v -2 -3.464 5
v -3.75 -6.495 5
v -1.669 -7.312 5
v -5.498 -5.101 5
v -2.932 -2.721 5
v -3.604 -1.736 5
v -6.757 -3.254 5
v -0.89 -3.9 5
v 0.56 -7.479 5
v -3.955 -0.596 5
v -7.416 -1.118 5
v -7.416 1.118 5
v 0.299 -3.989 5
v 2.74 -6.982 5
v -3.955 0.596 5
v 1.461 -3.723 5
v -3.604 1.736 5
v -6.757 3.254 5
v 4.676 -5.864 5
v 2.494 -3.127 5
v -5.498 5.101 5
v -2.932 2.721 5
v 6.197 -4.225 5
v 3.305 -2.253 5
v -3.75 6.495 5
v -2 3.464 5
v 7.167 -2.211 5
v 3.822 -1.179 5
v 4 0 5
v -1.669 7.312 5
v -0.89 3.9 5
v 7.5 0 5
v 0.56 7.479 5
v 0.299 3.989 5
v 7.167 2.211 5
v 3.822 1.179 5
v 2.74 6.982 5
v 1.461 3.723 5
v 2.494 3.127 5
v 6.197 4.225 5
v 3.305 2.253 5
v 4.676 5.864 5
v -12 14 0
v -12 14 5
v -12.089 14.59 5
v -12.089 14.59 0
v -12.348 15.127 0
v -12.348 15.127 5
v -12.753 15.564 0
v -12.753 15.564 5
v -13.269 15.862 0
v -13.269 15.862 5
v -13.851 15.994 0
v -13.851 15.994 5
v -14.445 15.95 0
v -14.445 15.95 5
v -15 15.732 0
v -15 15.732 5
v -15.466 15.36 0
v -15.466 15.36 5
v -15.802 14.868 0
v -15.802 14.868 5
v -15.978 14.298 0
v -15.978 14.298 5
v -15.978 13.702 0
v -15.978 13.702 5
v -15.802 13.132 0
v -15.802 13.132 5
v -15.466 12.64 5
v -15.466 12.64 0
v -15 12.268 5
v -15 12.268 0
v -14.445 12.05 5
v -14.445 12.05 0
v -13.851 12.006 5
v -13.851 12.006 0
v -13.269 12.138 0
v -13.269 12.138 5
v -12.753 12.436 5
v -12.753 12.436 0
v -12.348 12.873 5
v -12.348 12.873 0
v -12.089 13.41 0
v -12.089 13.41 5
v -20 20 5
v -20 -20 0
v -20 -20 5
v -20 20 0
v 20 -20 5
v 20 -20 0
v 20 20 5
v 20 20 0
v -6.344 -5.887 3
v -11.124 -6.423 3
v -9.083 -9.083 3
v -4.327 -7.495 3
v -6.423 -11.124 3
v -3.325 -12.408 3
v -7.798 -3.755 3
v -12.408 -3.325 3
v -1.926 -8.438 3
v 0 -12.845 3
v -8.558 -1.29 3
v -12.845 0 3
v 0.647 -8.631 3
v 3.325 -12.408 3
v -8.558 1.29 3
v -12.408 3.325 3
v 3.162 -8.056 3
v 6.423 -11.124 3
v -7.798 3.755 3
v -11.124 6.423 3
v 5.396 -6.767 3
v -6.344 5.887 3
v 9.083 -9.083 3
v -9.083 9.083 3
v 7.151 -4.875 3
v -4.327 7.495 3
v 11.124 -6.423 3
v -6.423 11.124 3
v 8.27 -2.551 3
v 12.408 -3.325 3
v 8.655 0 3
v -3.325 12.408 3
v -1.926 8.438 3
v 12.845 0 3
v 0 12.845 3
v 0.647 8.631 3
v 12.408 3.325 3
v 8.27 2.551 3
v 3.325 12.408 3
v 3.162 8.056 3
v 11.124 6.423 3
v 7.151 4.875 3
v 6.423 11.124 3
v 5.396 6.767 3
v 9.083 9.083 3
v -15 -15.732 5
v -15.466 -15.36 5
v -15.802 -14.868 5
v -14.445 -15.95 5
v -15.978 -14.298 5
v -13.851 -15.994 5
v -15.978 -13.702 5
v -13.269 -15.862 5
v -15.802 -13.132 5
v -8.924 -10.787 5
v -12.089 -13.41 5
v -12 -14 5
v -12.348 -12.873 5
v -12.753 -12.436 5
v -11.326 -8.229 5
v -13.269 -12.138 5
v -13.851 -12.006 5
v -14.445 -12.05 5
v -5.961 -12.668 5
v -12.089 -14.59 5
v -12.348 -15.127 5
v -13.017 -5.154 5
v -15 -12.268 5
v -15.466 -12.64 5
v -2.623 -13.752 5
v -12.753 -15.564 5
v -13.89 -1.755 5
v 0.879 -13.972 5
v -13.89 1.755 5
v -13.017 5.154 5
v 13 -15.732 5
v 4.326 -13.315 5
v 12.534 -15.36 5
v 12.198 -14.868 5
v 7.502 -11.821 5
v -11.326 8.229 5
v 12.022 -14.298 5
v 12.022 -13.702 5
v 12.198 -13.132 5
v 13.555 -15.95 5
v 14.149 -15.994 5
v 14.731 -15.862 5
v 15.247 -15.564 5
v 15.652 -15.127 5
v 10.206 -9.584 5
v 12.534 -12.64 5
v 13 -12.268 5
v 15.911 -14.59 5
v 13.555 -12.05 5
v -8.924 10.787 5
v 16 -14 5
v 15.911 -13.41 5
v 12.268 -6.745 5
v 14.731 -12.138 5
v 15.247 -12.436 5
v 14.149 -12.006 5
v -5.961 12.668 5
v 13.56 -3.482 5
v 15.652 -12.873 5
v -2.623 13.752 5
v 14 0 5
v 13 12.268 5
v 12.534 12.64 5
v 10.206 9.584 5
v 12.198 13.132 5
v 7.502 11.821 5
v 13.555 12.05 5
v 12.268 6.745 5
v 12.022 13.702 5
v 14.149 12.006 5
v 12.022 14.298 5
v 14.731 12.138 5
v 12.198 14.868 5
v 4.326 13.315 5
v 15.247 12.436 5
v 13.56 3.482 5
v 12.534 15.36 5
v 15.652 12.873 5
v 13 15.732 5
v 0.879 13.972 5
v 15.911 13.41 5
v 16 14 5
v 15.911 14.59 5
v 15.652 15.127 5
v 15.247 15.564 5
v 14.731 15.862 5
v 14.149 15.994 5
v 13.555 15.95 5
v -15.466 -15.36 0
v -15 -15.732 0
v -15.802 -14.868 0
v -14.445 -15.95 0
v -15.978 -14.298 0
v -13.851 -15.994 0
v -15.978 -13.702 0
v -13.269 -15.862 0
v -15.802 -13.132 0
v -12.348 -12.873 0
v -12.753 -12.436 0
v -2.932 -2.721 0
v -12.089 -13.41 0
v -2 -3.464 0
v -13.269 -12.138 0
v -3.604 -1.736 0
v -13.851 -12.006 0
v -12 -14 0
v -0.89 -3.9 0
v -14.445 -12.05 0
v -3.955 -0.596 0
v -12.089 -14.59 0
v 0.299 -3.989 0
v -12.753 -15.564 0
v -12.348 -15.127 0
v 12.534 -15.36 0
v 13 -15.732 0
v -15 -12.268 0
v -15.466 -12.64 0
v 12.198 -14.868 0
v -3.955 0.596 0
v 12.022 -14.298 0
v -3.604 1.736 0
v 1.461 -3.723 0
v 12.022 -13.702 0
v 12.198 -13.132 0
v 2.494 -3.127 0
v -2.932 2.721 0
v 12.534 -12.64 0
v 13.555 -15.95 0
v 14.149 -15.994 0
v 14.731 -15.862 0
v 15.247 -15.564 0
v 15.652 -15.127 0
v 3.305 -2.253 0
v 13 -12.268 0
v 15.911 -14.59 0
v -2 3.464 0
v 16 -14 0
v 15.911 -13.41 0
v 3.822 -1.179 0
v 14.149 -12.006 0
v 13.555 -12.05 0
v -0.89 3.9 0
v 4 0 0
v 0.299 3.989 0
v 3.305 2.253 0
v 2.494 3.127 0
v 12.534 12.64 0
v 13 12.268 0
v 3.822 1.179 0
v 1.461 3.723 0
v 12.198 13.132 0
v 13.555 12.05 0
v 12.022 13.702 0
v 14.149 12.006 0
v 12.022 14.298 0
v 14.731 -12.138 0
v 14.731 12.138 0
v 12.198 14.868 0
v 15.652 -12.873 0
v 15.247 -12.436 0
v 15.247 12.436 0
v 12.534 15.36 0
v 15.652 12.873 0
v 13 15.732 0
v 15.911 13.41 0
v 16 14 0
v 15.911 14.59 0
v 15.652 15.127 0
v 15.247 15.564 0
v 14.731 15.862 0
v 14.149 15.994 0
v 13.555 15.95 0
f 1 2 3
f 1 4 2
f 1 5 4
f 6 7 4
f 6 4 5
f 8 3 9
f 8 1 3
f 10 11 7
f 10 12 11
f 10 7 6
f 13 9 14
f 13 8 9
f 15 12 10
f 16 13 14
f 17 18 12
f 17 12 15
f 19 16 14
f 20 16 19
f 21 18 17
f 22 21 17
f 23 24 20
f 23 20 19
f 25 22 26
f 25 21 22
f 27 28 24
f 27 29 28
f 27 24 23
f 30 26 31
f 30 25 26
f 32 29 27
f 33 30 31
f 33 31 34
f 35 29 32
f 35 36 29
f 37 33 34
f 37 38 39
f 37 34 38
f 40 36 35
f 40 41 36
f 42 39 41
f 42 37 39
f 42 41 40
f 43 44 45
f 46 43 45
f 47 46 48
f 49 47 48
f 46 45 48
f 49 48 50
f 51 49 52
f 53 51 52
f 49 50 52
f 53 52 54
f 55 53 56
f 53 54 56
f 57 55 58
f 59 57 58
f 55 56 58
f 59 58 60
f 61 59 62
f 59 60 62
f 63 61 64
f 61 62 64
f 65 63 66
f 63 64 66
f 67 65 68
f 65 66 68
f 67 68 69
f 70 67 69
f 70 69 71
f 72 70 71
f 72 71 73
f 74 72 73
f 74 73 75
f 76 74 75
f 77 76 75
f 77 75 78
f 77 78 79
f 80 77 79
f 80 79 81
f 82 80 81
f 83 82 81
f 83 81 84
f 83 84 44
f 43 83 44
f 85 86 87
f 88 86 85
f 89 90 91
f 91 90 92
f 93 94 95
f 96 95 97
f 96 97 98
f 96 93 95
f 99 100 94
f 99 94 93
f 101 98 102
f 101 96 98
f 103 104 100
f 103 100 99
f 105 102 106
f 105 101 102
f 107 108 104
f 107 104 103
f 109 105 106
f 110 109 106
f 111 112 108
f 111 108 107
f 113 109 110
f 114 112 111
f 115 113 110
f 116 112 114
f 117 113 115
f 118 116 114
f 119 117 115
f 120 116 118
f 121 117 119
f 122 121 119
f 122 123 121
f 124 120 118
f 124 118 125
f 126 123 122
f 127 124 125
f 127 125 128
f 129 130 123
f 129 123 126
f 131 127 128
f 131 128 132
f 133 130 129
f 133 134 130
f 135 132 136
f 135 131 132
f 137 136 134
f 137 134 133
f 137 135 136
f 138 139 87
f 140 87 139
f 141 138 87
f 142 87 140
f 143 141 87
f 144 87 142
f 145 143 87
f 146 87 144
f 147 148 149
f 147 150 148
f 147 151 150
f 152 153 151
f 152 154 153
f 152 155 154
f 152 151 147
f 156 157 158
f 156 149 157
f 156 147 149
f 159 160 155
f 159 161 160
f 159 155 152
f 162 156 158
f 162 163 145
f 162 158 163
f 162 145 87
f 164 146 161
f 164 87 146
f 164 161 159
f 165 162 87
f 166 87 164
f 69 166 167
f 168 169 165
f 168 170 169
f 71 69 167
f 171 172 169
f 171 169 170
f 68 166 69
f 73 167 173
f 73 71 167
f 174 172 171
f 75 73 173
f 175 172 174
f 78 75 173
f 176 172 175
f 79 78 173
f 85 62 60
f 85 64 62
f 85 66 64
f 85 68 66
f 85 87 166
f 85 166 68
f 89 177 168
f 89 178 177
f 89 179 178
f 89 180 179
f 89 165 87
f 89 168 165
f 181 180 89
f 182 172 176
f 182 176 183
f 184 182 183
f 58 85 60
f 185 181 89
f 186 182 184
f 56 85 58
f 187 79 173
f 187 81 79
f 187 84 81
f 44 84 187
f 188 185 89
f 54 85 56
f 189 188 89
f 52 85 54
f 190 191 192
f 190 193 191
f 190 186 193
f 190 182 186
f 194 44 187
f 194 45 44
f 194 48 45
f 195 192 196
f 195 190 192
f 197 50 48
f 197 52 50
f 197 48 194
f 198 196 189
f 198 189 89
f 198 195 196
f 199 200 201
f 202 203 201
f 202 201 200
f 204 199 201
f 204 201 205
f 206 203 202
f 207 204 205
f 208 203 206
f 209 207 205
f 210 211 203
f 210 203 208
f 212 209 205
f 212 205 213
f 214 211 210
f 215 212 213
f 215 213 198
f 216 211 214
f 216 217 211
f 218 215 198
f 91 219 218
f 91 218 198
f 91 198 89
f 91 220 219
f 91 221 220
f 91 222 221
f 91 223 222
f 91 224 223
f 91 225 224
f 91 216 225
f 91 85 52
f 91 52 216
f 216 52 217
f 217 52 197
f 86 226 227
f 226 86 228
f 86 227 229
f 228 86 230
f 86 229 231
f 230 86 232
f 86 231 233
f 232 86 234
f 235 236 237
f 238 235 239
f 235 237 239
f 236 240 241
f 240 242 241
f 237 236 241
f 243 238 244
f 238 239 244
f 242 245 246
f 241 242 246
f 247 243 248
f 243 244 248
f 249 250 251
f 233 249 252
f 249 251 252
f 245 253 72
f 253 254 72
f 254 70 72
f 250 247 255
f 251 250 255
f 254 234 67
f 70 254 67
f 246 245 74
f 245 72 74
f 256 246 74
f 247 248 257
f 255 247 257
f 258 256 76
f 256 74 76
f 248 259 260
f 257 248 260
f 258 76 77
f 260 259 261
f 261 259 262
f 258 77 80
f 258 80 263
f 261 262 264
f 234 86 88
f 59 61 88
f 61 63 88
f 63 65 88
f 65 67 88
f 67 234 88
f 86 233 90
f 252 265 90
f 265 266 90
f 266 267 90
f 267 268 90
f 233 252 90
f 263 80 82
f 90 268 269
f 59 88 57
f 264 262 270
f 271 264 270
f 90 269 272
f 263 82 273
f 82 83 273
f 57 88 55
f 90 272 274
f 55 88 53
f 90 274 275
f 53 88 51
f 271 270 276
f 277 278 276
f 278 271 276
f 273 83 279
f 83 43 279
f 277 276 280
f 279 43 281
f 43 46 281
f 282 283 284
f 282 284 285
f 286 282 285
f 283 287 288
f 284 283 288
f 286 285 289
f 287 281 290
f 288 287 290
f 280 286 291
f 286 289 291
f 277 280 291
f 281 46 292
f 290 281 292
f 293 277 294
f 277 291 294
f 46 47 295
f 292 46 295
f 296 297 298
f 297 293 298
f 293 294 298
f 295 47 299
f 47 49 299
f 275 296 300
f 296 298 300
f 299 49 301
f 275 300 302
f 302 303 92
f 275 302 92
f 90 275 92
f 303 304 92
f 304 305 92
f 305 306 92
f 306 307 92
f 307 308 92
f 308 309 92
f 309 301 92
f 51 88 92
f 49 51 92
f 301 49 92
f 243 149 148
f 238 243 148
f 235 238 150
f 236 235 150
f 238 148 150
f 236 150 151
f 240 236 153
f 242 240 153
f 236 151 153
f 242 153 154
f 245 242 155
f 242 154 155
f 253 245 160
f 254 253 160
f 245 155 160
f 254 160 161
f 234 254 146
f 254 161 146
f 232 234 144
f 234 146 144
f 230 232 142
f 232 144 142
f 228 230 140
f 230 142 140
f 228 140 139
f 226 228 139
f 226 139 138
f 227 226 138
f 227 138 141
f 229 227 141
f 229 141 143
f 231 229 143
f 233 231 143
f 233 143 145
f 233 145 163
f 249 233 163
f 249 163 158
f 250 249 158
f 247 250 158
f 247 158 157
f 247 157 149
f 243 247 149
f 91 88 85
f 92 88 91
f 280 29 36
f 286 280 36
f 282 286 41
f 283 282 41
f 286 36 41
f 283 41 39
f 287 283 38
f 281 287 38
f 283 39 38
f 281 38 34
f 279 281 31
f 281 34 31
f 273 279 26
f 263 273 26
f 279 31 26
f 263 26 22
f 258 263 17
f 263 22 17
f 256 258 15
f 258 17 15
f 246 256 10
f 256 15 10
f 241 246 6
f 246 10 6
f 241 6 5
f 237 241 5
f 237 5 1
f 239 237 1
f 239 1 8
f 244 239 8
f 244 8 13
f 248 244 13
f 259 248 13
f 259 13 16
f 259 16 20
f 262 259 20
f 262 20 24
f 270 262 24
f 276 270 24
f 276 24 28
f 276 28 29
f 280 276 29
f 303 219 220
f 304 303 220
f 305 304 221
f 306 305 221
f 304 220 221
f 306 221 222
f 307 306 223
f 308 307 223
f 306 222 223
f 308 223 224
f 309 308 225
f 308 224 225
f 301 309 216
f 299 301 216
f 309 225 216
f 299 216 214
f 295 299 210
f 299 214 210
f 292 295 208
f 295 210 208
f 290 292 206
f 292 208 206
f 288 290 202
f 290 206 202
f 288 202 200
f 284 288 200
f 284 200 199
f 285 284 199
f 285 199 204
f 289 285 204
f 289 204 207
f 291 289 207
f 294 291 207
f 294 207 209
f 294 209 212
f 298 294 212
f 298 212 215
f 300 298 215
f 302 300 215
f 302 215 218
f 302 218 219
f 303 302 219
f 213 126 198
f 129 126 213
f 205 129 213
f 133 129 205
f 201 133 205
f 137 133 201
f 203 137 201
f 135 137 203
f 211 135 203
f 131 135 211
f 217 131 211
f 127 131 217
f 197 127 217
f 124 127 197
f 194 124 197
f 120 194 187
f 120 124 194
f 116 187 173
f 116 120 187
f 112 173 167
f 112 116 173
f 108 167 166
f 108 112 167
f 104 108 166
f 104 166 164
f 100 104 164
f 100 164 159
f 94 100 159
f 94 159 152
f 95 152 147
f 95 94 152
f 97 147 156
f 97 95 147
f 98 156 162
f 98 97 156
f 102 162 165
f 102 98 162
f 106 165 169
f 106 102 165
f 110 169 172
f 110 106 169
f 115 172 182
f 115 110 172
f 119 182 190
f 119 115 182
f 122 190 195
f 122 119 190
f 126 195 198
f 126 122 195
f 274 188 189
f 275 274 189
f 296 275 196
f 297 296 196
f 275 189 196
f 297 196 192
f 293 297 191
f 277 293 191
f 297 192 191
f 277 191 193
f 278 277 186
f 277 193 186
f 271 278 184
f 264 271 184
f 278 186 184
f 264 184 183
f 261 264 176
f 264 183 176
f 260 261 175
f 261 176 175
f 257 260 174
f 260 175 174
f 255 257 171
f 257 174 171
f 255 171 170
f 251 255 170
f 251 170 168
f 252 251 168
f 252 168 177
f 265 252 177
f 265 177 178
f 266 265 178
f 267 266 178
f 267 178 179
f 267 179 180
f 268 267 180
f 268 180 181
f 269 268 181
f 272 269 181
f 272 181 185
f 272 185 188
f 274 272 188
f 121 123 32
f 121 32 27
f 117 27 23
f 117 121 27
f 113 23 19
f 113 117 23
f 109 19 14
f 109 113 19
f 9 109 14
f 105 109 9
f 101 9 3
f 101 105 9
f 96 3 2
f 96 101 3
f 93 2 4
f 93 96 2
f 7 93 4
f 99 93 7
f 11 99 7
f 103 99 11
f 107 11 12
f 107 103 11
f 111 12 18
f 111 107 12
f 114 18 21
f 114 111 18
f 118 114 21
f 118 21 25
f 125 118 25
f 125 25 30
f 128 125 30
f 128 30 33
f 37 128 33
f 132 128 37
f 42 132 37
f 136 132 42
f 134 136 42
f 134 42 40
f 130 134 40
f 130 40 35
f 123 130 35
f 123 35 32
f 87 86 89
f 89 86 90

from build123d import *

# Parameters (mm, degrees)
SKETCH1_W           = 40
SKETCH1_H           = 40
BOSS_EXTRUDE1_DEPTH = 5
SKETCH2_R           = 14
SKETCH2_R_2         = 7.5
CUT_EXTRUDE1_DEPTH  = 2
CUT_EXTRUDE1_TAPER  = 30
SKETCH3_R           = 4
CUT_EXTRUDE2_DEPTH  = 6
SKETCH4_R           = 2
CUT_EXTRUDE3_DEPTH  = 6


with BuildPart() as part:
    # Sketch1 → Boss-Extrude1 (new body)
    with BuildSketch(Plane.XY):
        Rectangle(SKETCH1_W, SKETCH1_H)
    extrude(amount=BOSS_EXTRUDE1_DEPTH)

    # Sketch2 → Cut-Extrude1 (cut)
    with BuildSketch(Plane.XY.offset(5)):
        Circle(SKETCH2_R)
        Circle(SKETCH2_R_2, mode=Mode.SUBTRACT)
    extrude(amount=-CUT_EXTRUDE1_DEPTH, taper=CUT_EXTRUDE1_TAPER, mode=Mode.SUBTRACT)

    # Sketch3 → Cut-Extrude2 (cut, through all)
    with BuildSketch(Plane.XY.offset(5)):
        Circle(SKETCH3_R)
    extrude(amount=-CUT_EXTRUDE2_DEPTH, mode=Mode.SUBTRACT)

    # Sketch4 → Cut-Extrude3 (cut, through all)
    with BuildSketch(Plane.XY.offset(5)):
        with Locations((-14, 14)):
            Circle(SKETCH4_R)
        with Locations((14, 14)):
            Circle(SKETCH4_R)
        with Locations((14, -14)):
            Circle(SKETCH4_R)
        with Locations((-14, -14)):
            Circle(SKETCH4_R)
    extrude(amount=-CUT_EXTRUDE3_DEPTH, mode=Mode.SUBTRACT)


solid = part.part
